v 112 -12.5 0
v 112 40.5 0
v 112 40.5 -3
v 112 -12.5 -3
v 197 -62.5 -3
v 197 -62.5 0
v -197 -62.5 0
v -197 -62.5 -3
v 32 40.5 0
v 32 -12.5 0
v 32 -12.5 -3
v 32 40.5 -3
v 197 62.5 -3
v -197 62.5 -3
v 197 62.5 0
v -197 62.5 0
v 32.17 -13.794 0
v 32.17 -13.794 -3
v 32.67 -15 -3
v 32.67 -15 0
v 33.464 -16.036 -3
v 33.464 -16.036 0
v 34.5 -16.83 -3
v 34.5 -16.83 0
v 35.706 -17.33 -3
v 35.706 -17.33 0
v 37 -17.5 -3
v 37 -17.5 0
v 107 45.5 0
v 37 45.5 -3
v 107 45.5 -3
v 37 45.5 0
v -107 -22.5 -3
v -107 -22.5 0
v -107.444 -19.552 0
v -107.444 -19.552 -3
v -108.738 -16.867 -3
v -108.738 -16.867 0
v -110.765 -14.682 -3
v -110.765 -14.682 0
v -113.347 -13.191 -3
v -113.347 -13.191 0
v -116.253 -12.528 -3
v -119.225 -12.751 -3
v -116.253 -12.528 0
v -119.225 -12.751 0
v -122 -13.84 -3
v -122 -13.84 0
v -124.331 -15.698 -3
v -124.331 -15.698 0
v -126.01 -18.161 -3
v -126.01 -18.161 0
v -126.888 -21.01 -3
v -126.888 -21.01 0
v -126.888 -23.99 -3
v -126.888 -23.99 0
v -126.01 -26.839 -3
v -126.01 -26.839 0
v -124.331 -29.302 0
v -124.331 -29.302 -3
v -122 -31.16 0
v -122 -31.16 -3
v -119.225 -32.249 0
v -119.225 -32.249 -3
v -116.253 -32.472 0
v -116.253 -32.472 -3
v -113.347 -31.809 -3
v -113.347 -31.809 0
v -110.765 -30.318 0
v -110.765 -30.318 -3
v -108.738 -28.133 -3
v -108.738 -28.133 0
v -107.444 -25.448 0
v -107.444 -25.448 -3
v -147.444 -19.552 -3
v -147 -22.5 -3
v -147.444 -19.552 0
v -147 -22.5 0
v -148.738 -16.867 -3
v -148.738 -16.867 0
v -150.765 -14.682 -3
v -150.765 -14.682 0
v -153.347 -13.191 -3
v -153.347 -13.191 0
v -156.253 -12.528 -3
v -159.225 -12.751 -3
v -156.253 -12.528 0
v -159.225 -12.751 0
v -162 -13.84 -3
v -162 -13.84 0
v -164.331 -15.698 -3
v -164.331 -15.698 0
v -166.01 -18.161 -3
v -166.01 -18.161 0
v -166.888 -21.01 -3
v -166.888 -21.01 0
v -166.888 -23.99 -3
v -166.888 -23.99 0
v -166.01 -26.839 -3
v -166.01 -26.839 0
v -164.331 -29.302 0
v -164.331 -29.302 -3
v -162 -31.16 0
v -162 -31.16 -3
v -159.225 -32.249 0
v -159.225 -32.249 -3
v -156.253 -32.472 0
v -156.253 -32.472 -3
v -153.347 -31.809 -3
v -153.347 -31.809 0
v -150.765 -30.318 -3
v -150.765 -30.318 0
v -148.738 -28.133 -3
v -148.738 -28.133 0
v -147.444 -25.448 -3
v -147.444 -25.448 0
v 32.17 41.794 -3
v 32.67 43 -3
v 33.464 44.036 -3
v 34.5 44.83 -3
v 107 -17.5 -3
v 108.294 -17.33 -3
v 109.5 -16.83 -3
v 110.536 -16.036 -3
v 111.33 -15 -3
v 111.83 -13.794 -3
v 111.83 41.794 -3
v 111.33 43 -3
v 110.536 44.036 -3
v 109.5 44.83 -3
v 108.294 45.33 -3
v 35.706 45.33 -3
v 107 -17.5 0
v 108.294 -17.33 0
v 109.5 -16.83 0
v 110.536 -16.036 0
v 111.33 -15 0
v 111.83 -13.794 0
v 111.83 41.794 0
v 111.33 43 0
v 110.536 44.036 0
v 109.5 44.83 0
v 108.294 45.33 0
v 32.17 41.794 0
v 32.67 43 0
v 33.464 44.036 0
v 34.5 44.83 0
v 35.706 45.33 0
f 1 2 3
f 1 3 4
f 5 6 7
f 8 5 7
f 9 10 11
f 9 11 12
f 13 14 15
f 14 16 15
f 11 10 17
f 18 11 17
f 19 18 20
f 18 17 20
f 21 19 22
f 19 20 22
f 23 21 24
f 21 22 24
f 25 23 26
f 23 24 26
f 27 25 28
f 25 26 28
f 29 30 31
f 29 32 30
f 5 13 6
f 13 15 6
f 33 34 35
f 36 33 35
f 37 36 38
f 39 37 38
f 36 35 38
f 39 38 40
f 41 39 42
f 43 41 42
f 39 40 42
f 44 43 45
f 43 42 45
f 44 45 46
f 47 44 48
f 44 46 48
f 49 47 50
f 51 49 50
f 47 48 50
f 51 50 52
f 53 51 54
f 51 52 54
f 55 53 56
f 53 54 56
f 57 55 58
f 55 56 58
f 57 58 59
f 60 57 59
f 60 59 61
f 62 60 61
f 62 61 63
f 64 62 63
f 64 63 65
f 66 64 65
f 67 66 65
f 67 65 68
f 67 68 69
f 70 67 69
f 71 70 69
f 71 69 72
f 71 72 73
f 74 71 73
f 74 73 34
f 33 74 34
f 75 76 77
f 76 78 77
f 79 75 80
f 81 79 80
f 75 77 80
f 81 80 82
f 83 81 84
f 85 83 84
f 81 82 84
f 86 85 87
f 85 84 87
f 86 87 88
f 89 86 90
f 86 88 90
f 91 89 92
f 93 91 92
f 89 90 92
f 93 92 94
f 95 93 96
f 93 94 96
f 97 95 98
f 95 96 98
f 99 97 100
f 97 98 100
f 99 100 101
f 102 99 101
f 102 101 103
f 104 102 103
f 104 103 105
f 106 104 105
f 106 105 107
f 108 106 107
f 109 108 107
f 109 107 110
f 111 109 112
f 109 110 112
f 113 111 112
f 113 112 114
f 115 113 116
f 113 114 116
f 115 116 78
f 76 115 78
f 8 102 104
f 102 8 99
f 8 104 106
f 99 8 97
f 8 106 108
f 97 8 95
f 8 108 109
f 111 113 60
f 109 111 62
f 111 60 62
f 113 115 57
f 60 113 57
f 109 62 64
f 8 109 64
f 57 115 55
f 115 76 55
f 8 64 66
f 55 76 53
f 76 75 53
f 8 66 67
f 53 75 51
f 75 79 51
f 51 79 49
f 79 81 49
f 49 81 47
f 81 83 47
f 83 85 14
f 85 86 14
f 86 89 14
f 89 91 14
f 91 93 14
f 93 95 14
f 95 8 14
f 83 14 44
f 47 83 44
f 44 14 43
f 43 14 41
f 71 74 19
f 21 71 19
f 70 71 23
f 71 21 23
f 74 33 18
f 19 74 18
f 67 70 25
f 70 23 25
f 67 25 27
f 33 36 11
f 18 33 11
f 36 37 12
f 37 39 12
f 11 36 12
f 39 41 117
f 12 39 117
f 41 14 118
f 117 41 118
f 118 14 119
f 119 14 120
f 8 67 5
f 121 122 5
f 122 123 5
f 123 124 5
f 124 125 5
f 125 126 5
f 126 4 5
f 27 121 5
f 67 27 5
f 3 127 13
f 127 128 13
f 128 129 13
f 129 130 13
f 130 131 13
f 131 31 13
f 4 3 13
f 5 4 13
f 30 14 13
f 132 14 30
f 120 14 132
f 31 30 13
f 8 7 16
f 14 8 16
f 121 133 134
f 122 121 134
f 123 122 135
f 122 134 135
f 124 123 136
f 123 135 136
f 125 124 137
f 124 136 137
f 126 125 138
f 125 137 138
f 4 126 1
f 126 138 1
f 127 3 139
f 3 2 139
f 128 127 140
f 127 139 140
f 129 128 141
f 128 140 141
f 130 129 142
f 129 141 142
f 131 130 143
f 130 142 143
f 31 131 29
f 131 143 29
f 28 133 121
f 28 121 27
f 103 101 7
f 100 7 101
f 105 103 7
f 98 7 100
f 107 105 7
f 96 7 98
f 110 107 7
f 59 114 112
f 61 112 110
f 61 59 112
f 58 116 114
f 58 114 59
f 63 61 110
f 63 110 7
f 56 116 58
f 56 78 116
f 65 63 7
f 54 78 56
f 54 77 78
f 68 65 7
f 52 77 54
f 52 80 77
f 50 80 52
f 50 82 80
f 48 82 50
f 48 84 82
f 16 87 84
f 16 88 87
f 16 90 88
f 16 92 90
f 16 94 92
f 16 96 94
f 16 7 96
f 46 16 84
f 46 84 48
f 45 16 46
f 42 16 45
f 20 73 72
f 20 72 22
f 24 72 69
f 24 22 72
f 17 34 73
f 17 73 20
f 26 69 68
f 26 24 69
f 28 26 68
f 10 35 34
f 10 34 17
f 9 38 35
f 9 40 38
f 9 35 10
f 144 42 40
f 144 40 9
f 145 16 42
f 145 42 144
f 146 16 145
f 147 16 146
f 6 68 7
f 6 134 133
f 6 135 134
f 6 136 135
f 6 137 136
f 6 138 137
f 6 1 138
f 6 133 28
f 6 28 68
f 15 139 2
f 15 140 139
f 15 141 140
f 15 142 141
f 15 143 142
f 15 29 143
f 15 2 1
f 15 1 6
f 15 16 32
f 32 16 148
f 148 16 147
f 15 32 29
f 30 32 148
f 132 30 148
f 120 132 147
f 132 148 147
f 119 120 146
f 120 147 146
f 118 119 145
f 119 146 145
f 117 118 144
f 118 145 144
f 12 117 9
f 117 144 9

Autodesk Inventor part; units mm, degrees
ref_plane "YZ Plane" through (0, 0, 0) normal (1, 0, 0) x (0, 1, 0)
ref_plane "XZ Plane" through (0, 0, 0) normal (0, 1, 0) x (-1, 0, 0)
ref_plane "XY Plane" through (0, 0, 0) normal (0, 0, 1) x (1, 0, 0)
sketch "Sketch1" plane through (0, 0, 0) normal (0, 0, 1) x (1, 0, 0)
  line L0 (-197, 62.5) -> (197, 62.5)
  line L1 (197, 62.5) -> (197, -62.5)
  line L2 (197, -62.5) -> (-197, -62.5)
  line L3 (-197, -62.5) -> (-197, 62.5)
  line L4 (-197, 62.5) -> (197, -62.5) construction
  line L5 (197, 62.5) -> (-197, -62.5) construction
  point P0 (0, 0)
  dimension "d0" = 394
  dimension "d1" = 125
extrude "Extrusion1" add sketch "Sketch1" against normal blind 3
sketch "Sketch2" plane through (0, 0, 0) normal (0, 0, 1) x (1, 0, 0)
  circle A0 centre (-157, -22.5) radius 10
  circle A1 centre (-117, -22.5) radius 10
  line L0 (-197, -62.5) -> (197, -62.5) projected
  line L1 (-197, 62.5) -> (-197, -62.5) projected
  line L2 (37, 45.5) -> (107, 45.5)
  line L3 (112, 40.5) -> (112, -12.5)
  line L4 (107, -17.5) -> (37, -17.5)
  line L5 (32, -12.5) -> (32, 40.5)
  line L6 (197, 62.5) -> (-197, 62.5) projected
  line L7 (197, -62.5) -> (197, 62.5) projected
  arc A2 (37, 45.5) -> (32, 40.5) centre (37, 40.5) ccw
  arc A3 (112, 40.5) -> (107, 45.5) centre (107, 40.5) ccw
  arc A4 (107, -17.5) -> (112, -12.5) centre (107, -12.5) ccw
  arc A5 (32, -12.5) -> (37, -17.5) centre (37, -12.5) ccw
  point P0 (0, 0)
  point P1 (32, 45.5)
  point P2 (112, -17.5)
  point P3 (112, 45.5)
  point P4 (32, -17.5)
  dimension "d4" = 20
  dimension "USB" = 20
  dimension "d6" = 40
  dimension "d7" = 40
  dimension "d8" = 40
  dimension "d9" = 40
  dimension "d10" = 63
  dimension "d11" = 17
  dimension "d12" = 80
  dimension "d13" = 85
  dimension "d16" = 5
extrude "Extrusion2" cut sketch "Sketch2" against normal blind 3 contours A0 | A1 | L2 A3 L3 A4 L4 A5 L5 A2
equation "\"d4\" = USB"
properties part number "BackPanel"
